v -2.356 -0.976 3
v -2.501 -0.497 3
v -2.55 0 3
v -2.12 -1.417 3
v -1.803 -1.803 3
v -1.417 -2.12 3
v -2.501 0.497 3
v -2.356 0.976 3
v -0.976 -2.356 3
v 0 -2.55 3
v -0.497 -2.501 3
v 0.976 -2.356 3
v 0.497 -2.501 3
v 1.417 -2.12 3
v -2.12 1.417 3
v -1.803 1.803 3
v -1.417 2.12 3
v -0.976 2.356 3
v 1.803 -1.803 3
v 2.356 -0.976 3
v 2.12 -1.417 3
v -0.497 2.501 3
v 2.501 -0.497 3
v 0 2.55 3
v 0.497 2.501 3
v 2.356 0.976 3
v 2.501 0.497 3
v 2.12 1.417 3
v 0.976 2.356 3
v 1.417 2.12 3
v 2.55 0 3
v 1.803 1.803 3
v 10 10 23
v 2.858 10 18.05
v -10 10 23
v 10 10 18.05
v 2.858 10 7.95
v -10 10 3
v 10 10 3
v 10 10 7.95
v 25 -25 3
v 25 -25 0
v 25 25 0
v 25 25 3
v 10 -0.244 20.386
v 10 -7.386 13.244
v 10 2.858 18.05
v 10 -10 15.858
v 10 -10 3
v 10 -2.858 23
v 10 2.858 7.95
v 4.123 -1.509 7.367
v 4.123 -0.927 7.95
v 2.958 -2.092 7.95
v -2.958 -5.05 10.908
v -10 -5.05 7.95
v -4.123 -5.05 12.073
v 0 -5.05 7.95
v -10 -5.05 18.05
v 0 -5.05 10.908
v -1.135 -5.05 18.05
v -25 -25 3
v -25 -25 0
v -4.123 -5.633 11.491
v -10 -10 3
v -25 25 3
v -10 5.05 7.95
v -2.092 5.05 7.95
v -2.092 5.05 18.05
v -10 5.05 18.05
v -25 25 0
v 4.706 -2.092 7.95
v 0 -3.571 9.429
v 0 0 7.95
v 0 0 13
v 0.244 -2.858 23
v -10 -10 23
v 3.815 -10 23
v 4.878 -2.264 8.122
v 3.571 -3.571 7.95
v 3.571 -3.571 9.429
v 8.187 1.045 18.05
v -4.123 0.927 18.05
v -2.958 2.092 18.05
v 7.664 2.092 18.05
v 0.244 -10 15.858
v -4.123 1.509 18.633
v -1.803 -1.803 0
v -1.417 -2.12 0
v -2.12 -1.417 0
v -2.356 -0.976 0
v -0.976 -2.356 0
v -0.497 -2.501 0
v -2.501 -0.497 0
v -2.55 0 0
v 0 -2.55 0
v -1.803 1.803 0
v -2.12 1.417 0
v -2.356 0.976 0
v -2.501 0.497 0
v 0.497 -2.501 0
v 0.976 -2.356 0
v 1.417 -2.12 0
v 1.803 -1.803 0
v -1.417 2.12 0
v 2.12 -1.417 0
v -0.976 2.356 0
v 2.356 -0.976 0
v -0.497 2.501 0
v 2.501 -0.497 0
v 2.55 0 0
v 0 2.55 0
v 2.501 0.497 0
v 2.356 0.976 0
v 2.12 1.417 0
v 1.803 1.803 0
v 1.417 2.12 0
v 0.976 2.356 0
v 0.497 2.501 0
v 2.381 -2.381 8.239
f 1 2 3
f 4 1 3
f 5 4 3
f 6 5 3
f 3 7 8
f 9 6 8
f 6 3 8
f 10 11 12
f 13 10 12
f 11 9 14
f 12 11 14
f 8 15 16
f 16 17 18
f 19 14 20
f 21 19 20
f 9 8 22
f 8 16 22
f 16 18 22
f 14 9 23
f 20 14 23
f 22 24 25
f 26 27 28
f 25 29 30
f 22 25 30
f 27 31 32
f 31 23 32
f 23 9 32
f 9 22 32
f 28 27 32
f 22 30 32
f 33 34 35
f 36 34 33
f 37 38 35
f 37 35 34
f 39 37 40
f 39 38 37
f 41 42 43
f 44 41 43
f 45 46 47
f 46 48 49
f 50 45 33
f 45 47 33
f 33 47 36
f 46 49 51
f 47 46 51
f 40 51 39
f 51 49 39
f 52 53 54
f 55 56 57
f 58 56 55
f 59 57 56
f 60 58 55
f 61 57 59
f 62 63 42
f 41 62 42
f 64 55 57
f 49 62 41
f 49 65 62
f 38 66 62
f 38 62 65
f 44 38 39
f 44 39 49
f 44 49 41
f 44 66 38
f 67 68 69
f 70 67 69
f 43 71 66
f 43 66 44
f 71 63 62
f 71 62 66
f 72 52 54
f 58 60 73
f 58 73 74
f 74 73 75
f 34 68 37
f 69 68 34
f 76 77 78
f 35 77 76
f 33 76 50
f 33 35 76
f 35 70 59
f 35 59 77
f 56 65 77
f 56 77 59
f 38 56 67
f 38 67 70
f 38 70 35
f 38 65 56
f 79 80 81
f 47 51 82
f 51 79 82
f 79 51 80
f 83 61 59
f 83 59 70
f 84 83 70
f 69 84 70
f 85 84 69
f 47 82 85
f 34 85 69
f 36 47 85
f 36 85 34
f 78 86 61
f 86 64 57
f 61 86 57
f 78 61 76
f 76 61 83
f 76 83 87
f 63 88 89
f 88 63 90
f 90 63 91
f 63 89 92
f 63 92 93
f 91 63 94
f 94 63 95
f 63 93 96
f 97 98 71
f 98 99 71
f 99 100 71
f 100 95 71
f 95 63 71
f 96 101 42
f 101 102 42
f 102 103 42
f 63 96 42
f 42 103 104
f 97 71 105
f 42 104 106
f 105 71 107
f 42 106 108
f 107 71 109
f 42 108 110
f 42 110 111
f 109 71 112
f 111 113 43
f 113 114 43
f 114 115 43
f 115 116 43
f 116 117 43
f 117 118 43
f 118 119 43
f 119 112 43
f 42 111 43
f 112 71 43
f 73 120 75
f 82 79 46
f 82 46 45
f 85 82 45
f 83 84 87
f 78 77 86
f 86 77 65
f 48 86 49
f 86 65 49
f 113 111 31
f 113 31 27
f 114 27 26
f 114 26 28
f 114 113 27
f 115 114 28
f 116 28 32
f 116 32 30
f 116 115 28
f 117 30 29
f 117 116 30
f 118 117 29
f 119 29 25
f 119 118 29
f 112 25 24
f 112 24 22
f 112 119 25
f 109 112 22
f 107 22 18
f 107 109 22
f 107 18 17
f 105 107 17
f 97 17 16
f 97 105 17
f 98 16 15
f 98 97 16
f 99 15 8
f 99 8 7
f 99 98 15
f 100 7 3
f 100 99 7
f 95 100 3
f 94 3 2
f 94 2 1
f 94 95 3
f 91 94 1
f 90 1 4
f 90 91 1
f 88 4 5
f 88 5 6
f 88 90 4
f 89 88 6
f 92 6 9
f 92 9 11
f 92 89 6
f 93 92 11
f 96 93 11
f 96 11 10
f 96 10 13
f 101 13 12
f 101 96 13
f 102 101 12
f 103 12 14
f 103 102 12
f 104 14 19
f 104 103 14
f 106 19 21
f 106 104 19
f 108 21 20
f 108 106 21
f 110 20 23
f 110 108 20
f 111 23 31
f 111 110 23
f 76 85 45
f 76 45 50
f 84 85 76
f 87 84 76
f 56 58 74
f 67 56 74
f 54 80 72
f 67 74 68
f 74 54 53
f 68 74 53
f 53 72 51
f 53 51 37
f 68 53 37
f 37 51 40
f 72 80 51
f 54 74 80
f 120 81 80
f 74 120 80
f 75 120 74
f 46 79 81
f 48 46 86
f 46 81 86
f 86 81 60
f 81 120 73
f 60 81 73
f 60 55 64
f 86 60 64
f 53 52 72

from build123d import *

# Parameters (mm, degrees)
F0_W      = 50
F0_H      = 50
F0_R      = 2.55
F1_DEPTH  = 3
F2_W      = 20
F2_H      = 20
F3_DEPTH  = 20
F4_W      = 10.1
F4_H      = 10.1
F5_DEPTH  = 25
F7_W      = 10.1
F7_H      = 10.1
F8_DEPTH  = 25
F15_W     = 10.1
F15_H     = 10.1
F16_DEPTH = 25


with BuildPart() as f1:
    # F0 (on Top) → F1 (new body)
    with BuildSketch(Plane.XY):
        Rectangle(F0_W, F0_H)
        Circle(F0_R, mode=Mode.SUBTRACT)
    extrude(amount=F1_DEPTH)

    # F2 (on face) → F3 (join)
    with BuildSketch(Plane.XY.offset(3)):
        Rectangle(F2_W, F2_H)
    extrude(amount=F3_DEPTH)

    # F4 (on Right) → F5 (cut)
    with BuildSketch(Plane.YZ):
        with Locations((0, 13)):
            Rectangle(F4_W, F4_H)
    extrude(amount=-F5_DEPTH, mode=Mode.SUBTRACT)

    # F7 (on 3pt) → F8 (cut)
    with BuildSketch(Plane(origin=(0, 0, 0), x_dir=(-0.7071067812, 0.7071067812, 0), z_dir=(0.7071067812, 0.7071067812, 0))):
        with Locations((0, 13)):
            Rectangle(F7_W, F7_H)
    extrude(amount=F8_DEPTH, mode=Mode.SUBTRACT)

    # F15 (on line) → F16 (cut)
    with BuildSketch(Plane(origin=(4.3333333333, -4.3333333333, 4.3333333333), x_dir=(-0.8164965809, -0.4082482905, 0.4082482905), z_dir=(-0.5773502692, 0.5773502692, -0.5773502692))):
        with Locations((5.307227776, 9.1923881554)):
            Rectangle(F15_W, F15_H)
    extrude(amount=-F16_DEPTH, mode=Mode.SUBTRACT)


solid = f1.part
